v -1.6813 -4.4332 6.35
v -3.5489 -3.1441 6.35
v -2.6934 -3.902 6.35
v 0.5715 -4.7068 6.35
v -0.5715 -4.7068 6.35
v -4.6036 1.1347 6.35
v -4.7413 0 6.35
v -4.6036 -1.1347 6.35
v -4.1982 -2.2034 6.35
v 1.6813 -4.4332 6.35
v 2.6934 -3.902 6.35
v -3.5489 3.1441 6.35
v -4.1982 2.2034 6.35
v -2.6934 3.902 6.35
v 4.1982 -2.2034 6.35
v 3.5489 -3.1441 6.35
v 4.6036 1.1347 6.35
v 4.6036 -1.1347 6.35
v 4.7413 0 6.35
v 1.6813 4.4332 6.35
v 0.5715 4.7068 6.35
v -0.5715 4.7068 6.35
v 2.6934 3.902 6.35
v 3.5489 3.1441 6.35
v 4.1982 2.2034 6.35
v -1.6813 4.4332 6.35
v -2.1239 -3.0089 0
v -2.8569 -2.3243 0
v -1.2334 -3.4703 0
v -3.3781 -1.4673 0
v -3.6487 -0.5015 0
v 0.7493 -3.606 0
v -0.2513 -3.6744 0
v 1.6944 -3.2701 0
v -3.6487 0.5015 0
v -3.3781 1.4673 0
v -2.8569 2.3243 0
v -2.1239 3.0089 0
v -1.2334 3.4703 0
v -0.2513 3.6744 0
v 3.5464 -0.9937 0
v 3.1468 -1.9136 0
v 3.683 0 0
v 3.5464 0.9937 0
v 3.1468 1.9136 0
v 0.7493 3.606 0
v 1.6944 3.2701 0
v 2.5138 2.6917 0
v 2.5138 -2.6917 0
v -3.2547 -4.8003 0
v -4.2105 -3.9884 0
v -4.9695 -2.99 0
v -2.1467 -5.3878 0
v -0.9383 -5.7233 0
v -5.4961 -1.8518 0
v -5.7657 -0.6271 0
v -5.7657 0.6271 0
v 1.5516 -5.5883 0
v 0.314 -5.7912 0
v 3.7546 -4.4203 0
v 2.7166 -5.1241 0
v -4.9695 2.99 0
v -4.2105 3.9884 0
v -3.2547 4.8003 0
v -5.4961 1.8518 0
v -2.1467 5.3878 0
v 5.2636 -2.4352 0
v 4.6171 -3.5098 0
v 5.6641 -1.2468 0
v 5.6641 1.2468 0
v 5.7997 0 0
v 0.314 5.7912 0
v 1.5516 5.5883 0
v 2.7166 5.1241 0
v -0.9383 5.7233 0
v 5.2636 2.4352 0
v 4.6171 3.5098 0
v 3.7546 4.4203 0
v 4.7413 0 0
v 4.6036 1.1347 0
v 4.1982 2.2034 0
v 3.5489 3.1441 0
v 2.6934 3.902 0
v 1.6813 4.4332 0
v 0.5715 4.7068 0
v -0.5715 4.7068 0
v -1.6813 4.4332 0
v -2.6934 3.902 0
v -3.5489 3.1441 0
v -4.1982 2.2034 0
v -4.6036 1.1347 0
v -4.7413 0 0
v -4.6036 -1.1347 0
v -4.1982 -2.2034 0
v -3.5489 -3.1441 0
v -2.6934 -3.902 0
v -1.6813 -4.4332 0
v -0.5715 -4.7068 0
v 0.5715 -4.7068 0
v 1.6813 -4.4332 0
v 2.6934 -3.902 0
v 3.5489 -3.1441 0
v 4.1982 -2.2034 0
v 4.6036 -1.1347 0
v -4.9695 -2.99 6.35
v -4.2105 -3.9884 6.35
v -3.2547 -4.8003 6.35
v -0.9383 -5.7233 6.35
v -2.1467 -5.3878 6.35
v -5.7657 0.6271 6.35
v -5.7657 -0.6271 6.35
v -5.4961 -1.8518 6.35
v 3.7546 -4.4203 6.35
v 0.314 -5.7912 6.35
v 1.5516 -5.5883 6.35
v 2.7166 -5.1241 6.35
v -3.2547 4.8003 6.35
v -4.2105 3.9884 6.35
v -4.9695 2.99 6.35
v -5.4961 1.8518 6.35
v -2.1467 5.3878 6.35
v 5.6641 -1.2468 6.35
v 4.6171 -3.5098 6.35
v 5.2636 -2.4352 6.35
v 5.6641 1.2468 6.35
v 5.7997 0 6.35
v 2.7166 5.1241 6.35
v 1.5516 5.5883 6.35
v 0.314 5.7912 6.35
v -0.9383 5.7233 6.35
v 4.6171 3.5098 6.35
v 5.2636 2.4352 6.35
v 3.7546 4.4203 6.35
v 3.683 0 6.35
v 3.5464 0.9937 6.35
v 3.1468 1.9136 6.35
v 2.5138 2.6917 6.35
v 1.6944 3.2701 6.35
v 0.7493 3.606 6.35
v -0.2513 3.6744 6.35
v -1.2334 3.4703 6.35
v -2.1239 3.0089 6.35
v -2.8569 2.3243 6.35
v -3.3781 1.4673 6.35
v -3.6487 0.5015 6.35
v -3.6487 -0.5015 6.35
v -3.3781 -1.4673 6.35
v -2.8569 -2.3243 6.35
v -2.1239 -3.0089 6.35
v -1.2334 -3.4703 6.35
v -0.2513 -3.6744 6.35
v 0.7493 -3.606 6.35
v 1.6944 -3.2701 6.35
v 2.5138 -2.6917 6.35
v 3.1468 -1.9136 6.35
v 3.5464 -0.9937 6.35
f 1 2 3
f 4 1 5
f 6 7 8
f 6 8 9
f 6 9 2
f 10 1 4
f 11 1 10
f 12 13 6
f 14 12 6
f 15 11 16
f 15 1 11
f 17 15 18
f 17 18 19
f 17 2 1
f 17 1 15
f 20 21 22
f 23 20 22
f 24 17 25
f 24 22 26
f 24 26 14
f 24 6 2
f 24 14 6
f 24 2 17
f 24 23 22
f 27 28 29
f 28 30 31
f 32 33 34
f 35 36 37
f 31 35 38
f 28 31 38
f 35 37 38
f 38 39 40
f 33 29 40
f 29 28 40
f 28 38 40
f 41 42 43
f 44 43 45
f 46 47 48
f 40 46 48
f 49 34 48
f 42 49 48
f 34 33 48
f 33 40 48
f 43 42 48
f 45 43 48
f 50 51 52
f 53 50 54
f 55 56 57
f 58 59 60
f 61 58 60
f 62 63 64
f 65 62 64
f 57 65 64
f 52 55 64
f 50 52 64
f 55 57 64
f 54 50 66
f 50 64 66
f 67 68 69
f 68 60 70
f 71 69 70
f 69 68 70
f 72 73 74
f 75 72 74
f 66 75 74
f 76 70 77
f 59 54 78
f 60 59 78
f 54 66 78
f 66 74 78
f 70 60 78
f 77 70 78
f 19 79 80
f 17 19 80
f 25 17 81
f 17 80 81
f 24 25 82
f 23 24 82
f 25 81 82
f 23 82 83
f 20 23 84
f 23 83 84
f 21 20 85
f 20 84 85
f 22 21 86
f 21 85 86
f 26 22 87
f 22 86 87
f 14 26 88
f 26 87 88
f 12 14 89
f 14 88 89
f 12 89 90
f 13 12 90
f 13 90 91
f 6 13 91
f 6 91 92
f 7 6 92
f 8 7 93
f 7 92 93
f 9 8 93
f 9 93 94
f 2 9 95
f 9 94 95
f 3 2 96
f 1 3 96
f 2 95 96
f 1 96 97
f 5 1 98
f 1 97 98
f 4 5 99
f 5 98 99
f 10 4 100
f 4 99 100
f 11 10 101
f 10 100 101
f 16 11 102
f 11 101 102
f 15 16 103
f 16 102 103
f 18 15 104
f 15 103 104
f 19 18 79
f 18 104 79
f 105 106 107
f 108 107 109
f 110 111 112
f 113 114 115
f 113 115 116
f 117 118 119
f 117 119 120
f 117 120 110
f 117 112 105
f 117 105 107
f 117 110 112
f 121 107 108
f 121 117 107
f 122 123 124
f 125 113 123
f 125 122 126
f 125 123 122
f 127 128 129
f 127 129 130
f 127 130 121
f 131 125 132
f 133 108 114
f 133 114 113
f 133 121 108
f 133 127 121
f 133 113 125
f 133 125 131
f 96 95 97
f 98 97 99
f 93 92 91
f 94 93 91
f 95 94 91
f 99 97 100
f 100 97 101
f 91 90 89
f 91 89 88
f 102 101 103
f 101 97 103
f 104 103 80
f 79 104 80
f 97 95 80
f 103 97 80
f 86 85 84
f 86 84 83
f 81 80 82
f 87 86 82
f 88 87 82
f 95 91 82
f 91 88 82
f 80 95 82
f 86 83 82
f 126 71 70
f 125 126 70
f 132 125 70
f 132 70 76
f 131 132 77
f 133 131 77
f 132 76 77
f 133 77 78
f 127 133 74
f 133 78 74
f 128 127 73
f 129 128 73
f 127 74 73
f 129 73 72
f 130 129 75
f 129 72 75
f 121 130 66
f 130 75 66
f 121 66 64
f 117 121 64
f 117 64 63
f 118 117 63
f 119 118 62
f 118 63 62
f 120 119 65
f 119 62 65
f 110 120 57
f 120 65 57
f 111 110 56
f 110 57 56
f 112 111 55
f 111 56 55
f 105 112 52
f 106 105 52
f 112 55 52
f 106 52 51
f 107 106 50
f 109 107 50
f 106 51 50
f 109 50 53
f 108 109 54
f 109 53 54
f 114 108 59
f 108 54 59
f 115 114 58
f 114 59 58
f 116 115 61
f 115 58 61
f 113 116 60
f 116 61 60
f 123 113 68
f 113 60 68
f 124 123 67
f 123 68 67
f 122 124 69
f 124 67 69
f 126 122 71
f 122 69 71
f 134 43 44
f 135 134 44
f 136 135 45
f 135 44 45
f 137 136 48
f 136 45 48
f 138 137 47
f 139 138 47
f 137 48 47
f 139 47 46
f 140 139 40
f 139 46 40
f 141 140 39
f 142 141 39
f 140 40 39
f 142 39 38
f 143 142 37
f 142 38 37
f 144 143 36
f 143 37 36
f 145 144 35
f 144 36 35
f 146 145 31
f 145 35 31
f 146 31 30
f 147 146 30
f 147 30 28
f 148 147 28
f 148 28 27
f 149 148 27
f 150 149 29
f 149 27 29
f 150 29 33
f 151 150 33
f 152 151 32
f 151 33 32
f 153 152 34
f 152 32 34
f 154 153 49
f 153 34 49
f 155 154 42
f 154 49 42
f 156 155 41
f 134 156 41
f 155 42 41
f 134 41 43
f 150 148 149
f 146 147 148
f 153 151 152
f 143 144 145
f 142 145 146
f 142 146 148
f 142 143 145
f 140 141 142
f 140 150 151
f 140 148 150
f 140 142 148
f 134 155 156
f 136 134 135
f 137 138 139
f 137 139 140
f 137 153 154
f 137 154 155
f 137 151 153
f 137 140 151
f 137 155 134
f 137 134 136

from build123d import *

# Parameters (mm, degrees)
F0_R     = 3.683
F1_DEPTH = 6.35
F2_R     = 4.741333
F3_DEPTH = 6.35
F4_R     = 5.799667
F5_DEPTH = 6.35


with BuildPart() as f1:
    # F0 (on Top) → F1 (new body)
    with BuildSketch(Plane.XY):
        Circle(F0_R)
    extrude(amount=F1_DEPTH)


with BuildPart() as f3:
    # F2 (on Top) → F3 (new body)
    with BuildSketch(Plane.XY):
        Circle(F2_R)
    extrude(amount=F3_DEPTH)


with BuildPart() as f5:
    # F4 (on Top) → F5 (new body)
    with BuildSketch(Plane.XY):
        Circle(F4_R)
    extrude(amount=F5_DEPTH)


solid = Compound([f1.part, f3.part, f5.part])
